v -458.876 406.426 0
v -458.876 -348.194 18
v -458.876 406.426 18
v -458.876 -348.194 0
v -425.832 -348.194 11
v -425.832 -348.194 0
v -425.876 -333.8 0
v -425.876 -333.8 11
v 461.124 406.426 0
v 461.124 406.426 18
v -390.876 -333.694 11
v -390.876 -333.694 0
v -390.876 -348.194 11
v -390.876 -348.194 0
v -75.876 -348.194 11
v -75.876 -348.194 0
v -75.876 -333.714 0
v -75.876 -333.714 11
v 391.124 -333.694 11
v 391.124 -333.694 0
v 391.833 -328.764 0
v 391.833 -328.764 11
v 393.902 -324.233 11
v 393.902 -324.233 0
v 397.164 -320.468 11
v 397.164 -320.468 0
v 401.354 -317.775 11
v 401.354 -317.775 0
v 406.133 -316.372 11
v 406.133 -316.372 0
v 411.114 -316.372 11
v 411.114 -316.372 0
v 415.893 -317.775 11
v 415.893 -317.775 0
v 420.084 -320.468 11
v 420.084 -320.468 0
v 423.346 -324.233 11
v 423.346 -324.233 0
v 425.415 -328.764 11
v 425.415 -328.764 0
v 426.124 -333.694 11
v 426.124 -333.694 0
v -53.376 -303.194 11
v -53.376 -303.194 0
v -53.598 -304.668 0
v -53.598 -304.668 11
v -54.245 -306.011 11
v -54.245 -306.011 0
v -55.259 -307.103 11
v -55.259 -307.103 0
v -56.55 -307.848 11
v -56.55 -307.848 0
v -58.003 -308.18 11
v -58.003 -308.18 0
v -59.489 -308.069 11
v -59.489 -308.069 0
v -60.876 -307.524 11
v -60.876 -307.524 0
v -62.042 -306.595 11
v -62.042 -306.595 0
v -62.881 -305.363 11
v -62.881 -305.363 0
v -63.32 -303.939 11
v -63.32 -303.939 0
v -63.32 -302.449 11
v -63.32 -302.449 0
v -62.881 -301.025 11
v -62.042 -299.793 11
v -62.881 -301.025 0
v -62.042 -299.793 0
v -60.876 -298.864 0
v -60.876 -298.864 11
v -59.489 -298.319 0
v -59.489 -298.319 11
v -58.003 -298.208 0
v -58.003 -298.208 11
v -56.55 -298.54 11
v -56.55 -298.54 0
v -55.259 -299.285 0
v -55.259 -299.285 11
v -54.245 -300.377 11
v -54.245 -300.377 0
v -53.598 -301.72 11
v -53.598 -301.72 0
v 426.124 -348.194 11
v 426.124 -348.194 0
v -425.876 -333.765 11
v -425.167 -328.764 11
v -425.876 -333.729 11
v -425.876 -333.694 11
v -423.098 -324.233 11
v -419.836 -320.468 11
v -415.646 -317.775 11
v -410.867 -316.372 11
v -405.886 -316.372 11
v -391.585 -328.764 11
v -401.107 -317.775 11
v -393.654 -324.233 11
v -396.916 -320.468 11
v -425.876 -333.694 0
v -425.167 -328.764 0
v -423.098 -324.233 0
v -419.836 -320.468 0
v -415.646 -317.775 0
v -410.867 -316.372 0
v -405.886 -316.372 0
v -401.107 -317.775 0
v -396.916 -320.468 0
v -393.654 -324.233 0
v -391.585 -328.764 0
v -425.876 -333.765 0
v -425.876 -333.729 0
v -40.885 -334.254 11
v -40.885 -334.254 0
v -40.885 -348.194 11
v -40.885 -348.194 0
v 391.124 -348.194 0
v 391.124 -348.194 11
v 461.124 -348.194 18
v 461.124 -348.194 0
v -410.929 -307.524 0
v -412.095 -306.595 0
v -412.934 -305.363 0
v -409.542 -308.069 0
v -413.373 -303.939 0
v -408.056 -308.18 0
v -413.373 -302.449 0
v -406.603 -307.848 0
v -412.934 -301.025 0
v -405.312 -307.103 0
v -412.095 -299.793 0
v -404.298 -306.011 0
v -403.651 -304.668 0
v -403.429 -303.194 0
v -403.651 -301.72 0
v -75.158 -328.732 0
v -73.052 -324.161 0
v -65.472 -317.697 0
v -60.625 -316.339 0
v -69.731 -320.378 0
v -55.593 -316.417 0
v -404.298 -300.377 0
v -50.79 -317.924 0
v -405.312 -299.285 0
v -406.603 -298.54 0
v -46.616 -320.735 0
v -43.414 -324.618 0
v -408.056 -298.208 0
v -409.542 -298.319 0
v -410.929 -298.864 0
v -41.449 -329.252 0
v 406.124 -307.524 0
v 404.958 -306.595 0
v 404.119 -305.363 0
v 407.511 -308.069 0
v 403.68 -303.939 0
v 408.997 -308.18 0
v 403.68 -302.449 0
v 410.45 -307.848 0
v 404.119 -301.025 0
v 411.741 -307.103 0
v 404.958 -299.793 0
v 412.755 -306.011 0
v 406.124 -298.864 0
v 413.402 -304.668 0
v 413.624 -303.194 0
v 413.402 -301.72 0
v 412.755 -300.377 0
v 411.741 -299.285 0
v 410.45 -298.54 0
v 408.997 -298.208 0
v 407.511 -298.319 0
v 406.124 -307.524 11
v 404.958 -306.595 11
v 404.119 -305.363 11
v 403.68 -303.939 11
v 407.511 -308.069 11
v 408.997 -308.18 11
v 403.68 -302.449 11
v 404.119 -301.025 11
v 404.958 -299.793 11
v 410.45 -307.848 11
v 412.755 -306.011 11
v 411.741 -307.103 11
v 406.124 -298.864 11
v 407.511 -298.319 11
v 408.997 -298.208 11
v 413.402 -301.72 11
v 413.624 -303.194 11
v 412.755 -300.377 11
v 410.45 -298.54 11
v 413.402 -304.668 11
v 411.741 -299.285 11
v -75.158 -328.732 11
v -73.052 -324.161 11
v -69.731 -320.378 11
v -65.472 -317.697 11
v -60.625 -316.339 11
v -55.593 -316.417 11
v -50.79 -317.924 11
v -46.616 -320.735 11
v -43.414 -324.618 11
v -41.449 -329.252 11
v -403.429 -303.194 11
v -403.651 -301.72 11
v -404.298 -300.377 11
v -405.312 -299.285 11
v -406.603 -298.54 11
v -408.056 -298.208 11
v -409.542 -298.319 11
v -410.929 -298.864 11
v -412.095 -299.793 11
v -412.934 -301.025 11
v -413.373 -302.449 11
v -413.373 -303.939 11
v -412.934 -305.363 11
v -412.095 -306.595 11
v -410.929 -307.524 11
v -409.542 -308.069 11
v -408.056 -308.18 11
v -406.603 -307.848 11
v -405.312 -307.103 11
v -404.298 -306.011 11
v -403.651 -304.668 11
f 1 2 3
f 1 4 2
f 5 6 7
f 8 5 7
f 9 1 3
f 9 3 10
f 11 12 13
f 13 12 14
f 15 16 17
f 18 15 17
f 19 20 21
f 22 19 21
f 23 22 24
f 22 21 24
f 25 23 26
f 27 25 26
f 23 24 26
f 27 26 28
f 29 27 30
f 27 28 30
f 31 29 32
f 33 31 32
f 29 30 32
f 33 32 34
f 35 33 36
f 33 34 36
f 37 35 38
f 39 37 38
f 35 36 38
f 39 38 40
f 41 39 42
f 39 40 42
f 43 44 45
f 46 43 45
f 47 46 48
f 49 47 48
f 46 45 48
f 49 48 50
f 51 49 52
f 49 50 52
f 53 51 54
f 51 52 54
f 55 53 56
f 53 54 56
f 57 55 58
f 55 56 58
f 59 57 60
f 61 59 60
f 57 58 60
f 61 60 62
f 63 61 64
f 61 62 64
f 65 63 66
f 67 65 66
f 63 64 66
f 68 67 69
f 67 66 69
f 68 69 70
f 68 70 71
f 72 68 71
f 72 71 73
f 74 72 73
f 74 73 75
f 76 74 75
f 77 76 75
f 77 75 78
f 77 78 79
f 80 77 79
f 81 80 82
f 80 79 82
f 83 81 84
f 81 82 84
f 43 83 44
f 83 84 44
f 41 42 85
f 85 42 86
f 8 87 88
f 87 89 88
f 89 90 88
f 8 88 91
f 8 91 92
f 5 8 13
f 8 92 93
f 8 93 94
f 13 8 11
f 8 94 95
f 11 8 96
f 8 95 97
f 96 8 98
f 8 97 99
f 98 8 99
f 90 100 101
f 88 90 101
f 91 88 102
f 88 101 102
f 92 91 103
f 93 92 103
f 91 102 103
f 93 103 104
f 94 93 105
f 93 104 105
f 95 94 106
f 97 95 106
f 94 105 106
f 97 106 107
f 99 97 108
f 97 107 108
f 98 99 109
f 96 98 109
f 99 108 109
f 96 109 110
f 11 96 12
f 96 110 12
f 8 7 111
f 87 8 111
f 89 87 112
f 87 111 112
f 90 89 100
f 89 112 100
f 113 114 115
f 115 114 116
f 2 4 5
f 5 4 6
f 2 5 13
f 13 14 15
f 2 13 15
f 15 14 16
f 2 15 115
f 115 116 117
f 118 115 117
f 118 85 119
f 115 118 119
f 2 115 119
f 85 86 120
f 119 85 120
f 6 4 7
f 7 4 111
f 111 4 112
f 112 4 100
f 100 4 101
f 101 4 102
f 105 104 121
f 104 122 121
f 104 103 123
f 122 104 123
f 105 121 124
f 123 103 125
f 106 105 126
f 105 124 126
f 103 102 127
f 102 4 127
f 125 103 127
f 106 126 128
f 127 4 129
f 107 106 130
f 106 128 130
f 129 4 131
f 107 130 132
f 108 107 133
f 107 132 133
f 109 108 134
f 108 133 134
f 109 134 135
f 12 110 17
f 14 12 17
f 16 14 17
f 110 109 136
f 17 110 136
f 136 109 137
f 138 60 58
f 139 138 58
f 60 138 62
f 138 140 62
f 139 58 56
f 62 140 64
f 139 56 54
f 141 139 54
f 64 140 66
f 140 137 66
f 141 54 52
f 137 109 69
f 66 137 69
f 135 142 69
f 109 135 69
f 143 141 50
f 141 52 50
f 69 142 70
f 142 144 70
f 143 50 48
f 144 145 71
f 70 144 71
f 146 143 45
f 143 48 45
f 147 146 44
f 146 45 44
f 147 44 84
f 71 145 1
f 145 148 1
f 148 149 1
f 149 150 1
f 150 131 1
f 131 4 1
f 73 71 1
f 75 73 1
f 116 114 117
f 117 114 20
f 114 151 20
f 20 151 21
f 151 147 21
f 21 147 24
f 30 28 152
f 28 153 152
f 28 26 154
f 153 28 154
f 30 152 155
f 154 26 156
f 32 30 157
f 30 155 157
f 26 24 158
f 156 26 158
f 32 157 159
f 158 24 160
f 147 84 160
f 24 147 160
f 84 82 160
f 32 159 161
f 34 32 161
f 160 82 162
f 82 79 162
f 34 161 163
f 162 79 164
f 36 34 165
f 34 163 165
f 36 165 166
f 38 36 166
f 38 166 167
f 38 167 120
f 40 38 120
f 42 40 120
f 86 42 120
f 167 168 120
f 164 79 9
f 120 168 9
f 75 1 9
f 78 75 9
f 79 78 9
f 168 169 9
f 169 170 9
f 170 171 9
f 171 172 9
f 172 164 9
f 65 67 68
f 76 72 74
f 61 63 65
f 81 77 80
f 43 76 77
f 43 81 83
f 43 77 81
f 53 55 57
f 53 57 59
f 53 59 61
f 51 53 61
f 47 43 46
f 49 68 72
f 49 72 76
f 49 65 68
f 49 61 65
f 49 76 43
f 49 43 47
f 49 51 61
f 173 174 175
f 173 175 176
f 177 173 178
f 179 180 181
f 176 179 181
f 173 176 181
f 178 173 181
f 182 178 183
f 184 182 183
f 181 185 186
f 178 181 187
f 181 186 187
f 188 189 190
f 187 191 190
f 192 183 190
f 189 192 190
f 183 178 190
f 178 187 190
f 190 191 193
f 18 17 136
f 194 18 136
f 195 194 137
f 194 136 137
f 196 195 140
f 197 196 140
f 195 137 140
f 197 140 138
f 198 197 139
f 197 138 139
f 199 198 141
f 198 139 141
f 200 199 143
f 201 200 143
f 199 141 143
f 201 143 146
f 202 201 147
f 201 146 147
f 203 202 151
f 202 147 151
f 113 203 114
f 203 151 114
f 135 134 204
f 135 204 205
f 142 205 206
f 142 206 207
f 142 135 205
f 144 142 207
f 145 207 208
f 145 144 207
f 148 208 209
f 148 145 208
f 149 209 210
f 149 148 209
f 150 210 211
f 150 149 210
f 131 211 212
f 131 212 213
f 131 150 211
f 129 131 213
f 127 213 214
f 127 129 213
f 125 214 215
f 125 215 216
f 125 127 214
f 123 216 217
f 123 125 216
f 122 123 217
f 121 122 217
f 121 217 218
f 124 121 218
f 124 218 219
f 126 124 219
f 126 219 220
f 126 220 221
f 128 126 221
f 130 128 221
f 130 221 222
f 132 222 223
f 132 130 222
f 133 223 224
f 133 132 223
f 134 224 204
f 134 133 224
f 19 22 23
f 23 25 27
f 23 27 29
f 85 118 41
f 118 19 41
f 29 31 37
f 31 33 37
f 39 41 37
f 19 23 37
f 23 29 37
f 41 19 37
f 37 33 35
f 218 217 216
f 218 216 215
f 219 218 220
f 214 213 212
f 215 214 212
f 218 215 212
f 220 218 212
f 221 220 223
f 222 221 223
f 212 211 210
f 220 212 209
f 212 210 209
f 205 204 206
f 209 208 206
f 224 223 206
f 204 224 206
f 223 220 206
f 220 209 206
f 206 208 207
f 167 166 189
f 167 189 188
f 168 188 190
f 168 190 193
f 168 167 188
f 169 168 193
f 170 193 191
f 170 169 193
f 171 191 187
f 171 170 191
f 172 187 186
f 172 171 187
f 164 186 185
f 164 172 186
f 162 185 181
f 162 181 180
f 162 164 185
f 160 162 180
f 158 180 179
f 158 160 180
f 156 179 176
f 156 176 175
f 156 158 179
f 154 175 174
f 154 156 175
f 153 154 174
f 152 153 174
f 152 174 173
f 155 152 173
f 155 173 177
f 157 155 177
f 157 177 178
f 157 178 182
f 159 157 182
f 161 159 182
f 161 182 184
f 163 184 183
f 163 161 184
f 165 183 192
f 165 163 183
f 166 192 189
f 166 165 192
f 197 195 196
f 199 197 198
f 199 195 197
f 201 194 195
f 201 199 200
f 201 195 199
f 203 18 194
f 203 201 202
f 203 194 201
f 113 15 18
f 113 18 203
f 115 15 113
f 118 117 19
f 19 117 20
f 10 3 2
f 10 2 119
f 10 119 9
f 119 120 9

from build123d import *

# Parameters (mm, degrees)
F0_R     = 5
F1_DEPTH = 11
F2_W     = 920
F2_H     = 754.619706
F3_DEPTH = 7
F4_R     = 5
F5_DEPTH = 11


with BuildPart() as f1:
    # F0 (on Top) → F1 (new body)
    with BuildSketch(Plane.XY):
        with BuildLine():
            Line((461.123695, 406.42578), (-458.876305, 406.42578))
            Line((-458.876305, 406.42578), (-458.876305, -348.193926))
            Line((-458.876305, -348.193926), (-425.832388, -348.193926))
            Line((-425.832388, -348.193926), (-425.875983, -333.799931))
            ThreePointArc((-425.875983, -333.799931), (-425.876224, -333.746929), (-425.876305, -333.693926))
            ThreePointArc((-425.876305, -333.693926), (-408.376305, -316.193926), (-390.876305, -333.693926))
            Line((-390.876305, -333.693926), (-390.876305, -348.193926))
            Line((-390.876305, -348.193926), (391.123695, -348.193926))
            Line((391.123695, -348.193926), (391.123695, -333.693926))
            ThreePointArc((391.123695, -333.693926), (408.623695, -316.193926), (426.123695, -333.693926))
            Line((426.123695, -333.693926), (426.123695, -348.193926))
            Line((426.123695, -348.193926), (461.123695, -348.193926))
            Line((461.123695, -348.193926), (461.123695, 406.42578))
        make_face()
        with Locations((-408.429307, -303.193926)):
            Circle(F0_R, mode=Mode.SUBTRACT)
        with Locations((408.623695, -303.193926)):
            Circle(F0_R, mode=Mode.SUBTRACT)
    extrude(amount=F1_DEPTH)

    # F2 (on face) → F3 (join)
    with BuildSketch(Plane.XY.offset(11)):
        with Locations((1.123695, 29.115927)):
            Rectangle(F2_W, F2_H)
    extrude(amount=F3_DEPTH)

    # F4 (on face) → F5 (cut)
    with BuildSketch(Plane(origin=(0, 0, 0), x_dir=(1, 0, 0), z_dir=(0, 0, -1))):
        with BuildLine():
            Line((-75.876305, 348.193926), (-75.876305, 333.713589))
            ThreePointArc((-75.876305, 333.713589), (-58.106118, 316.196012), (-40.885277, 334.25391))
            Line((-40.885277, 334.25391), (-40.885277, 348.193926))
            Line((-40.885277, 348.193926), (-56.401658, 373.656452))
            Line((-56.401658, 373.656452), (-75.876305, 348.193926))
        make_face()
        with Locations((-58.376316, 303.193926)):
            Circle(F4_R)
    extrude(amount=-F5_DEPTH, mode=Mode.SUBTRACT)


solid = f1.part
